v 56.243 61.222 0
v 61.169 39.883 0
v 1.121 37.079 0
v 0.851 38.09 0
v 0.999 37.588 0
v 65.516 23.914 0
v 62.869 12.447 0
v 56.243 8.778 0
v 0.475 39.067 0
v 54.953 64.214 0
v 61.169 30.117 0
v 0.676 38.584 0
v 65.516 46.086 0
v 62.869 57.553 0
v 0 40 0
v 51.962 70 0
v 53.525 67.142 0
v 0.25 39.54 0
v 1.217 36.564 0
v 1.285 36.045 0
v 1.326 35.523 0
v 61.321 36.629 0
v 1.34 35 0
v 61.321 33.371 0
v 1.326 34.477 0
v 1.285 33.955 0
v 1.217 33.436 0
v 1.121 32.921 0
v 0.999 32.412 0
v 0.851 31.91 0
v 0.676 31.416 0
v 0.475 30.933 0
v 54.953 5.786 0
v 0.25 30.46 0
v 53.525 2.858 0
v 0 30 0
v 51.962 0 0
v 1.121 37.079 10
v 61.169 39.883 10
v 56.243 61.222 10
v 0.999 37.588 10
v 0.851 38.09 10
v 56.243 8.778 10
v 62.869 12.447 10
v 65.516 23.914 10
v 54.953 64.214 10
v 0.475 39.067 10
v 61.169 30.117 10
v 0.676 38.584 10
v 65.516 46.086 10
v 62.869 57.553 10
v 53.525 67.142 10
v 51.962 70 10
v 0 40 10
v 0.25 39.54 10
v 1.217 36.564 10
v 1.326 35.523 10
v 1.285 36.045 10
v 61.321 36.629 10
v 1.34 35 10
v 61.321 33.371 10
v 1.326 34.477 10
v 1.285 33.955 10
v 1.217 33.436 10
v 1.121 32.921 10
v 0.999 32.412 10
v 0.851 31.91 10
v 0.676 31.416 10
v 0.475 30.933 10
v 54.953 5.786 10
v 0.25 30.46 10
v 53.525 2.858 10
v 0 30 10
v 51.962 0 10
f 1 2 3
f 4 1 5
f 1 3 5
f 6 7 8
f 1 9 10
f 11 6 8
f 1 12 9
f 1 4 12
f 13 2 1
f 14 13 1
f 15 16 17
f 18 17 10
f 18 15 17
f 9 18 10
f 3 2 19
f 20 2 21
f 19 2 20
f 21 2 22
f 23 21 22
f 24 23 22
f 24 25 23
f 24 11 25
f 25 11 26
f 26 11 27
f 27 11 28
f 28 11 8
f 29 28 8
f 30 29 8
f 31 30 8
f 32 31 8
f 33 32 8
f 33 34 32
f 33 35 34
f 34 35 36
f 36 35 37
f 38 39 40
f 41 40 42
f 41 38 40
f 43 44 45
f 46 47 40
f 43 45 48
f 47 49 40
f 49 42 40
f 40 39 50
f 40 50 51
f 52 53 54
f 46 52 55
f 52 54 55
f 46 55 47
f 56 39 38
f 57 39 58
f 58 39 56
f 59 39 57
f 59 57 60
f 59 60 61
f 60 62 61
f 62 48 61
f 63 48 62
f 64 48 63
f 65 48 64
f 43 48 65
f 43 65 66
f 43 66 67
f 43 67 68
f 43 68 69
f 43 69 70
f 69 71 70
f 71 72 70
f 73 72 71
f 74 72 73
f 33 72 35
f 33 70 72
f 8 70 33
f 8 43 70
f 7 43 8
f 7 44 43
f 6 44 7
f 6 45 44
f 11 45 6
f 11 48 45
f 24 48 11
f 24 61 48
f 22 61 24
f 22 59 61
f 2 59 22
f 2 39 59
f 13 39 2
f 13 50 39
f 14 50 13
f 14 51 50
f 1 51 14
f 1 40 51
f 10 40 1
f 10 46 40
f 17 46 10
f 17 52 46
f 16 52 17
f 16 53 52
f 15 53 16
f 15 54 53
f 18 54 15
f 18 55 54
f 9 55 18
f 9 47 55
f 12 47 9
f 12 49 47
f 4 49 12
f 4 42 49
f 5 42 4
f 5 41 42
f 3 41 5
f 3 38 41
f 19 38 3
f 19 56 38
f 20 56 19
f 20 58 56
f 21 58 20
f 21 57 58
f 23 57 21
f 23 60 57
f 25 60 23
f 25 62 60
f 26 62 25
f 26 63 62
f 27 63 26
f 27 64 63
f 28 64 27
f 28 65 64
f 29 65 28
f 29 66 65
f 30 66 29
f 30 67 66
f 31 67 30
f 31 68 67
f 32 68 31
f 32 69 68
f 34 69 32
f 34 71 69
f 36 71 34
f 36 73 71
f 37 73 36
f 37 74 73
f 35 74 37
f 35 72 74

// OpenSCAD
$fn = 32;

// ----------------------------------------------------------------------
// Gear sector: 2 teeth on 60 degrees
// ----------------------------------------------------------------------

// --- parameters (mm) ---
sector_angle = 60;        // sector angle, degrees
root_r = 70;              // root circle radius
tooth_h = 5;              // tooth height over the root circle
teeth = 2;                // number of teeth on the sector
hub_r = 10;               // hub bore radius
plate_t = 10;             // sector thickness, Z
arc_step = 3;             // sampling step of the root/hub arcs, degrees

tip_r = root_r + tooth_h;  // tip circle radius

profile = [[51.962, 0], [53.525, 2.858], [54.953, 5.786], [56.243, 8.778], [62.869, 12.447], [65.516, 23.914], [61.169, 30.117], [61.321, 33.371], [61.321, 36.629], [61.169, 39.883], [65.516, 46.086], [62.869, 57.553], [56.243, 61.222], [54.953, 64.214], [53.525, 67.142], [51.962, 70], [0, 40], [0.25, 39.54], [0.475, 39.067], [0.676, 38.584], [0.851, 38.09], [0.999, 37.588], [1.121, 37.079], [1.217, 36.564], [1.285, 36.045], [1.326, 35.523], [1.34, 35], [1.326, 34.477], [1.285, 33.955], [1.217, 33.436], [1.121, 32.921], [0.999, 32.412], [0.851, 31.91], [0.676, 31.416], [0.475, 30.933], [0.25, 30.46], [0, 30]];  // primary outline, 37 points, counter clockwise

// --- the one profile operation ---
linear_extrude(height = plate_t) polygon(points = profile);
